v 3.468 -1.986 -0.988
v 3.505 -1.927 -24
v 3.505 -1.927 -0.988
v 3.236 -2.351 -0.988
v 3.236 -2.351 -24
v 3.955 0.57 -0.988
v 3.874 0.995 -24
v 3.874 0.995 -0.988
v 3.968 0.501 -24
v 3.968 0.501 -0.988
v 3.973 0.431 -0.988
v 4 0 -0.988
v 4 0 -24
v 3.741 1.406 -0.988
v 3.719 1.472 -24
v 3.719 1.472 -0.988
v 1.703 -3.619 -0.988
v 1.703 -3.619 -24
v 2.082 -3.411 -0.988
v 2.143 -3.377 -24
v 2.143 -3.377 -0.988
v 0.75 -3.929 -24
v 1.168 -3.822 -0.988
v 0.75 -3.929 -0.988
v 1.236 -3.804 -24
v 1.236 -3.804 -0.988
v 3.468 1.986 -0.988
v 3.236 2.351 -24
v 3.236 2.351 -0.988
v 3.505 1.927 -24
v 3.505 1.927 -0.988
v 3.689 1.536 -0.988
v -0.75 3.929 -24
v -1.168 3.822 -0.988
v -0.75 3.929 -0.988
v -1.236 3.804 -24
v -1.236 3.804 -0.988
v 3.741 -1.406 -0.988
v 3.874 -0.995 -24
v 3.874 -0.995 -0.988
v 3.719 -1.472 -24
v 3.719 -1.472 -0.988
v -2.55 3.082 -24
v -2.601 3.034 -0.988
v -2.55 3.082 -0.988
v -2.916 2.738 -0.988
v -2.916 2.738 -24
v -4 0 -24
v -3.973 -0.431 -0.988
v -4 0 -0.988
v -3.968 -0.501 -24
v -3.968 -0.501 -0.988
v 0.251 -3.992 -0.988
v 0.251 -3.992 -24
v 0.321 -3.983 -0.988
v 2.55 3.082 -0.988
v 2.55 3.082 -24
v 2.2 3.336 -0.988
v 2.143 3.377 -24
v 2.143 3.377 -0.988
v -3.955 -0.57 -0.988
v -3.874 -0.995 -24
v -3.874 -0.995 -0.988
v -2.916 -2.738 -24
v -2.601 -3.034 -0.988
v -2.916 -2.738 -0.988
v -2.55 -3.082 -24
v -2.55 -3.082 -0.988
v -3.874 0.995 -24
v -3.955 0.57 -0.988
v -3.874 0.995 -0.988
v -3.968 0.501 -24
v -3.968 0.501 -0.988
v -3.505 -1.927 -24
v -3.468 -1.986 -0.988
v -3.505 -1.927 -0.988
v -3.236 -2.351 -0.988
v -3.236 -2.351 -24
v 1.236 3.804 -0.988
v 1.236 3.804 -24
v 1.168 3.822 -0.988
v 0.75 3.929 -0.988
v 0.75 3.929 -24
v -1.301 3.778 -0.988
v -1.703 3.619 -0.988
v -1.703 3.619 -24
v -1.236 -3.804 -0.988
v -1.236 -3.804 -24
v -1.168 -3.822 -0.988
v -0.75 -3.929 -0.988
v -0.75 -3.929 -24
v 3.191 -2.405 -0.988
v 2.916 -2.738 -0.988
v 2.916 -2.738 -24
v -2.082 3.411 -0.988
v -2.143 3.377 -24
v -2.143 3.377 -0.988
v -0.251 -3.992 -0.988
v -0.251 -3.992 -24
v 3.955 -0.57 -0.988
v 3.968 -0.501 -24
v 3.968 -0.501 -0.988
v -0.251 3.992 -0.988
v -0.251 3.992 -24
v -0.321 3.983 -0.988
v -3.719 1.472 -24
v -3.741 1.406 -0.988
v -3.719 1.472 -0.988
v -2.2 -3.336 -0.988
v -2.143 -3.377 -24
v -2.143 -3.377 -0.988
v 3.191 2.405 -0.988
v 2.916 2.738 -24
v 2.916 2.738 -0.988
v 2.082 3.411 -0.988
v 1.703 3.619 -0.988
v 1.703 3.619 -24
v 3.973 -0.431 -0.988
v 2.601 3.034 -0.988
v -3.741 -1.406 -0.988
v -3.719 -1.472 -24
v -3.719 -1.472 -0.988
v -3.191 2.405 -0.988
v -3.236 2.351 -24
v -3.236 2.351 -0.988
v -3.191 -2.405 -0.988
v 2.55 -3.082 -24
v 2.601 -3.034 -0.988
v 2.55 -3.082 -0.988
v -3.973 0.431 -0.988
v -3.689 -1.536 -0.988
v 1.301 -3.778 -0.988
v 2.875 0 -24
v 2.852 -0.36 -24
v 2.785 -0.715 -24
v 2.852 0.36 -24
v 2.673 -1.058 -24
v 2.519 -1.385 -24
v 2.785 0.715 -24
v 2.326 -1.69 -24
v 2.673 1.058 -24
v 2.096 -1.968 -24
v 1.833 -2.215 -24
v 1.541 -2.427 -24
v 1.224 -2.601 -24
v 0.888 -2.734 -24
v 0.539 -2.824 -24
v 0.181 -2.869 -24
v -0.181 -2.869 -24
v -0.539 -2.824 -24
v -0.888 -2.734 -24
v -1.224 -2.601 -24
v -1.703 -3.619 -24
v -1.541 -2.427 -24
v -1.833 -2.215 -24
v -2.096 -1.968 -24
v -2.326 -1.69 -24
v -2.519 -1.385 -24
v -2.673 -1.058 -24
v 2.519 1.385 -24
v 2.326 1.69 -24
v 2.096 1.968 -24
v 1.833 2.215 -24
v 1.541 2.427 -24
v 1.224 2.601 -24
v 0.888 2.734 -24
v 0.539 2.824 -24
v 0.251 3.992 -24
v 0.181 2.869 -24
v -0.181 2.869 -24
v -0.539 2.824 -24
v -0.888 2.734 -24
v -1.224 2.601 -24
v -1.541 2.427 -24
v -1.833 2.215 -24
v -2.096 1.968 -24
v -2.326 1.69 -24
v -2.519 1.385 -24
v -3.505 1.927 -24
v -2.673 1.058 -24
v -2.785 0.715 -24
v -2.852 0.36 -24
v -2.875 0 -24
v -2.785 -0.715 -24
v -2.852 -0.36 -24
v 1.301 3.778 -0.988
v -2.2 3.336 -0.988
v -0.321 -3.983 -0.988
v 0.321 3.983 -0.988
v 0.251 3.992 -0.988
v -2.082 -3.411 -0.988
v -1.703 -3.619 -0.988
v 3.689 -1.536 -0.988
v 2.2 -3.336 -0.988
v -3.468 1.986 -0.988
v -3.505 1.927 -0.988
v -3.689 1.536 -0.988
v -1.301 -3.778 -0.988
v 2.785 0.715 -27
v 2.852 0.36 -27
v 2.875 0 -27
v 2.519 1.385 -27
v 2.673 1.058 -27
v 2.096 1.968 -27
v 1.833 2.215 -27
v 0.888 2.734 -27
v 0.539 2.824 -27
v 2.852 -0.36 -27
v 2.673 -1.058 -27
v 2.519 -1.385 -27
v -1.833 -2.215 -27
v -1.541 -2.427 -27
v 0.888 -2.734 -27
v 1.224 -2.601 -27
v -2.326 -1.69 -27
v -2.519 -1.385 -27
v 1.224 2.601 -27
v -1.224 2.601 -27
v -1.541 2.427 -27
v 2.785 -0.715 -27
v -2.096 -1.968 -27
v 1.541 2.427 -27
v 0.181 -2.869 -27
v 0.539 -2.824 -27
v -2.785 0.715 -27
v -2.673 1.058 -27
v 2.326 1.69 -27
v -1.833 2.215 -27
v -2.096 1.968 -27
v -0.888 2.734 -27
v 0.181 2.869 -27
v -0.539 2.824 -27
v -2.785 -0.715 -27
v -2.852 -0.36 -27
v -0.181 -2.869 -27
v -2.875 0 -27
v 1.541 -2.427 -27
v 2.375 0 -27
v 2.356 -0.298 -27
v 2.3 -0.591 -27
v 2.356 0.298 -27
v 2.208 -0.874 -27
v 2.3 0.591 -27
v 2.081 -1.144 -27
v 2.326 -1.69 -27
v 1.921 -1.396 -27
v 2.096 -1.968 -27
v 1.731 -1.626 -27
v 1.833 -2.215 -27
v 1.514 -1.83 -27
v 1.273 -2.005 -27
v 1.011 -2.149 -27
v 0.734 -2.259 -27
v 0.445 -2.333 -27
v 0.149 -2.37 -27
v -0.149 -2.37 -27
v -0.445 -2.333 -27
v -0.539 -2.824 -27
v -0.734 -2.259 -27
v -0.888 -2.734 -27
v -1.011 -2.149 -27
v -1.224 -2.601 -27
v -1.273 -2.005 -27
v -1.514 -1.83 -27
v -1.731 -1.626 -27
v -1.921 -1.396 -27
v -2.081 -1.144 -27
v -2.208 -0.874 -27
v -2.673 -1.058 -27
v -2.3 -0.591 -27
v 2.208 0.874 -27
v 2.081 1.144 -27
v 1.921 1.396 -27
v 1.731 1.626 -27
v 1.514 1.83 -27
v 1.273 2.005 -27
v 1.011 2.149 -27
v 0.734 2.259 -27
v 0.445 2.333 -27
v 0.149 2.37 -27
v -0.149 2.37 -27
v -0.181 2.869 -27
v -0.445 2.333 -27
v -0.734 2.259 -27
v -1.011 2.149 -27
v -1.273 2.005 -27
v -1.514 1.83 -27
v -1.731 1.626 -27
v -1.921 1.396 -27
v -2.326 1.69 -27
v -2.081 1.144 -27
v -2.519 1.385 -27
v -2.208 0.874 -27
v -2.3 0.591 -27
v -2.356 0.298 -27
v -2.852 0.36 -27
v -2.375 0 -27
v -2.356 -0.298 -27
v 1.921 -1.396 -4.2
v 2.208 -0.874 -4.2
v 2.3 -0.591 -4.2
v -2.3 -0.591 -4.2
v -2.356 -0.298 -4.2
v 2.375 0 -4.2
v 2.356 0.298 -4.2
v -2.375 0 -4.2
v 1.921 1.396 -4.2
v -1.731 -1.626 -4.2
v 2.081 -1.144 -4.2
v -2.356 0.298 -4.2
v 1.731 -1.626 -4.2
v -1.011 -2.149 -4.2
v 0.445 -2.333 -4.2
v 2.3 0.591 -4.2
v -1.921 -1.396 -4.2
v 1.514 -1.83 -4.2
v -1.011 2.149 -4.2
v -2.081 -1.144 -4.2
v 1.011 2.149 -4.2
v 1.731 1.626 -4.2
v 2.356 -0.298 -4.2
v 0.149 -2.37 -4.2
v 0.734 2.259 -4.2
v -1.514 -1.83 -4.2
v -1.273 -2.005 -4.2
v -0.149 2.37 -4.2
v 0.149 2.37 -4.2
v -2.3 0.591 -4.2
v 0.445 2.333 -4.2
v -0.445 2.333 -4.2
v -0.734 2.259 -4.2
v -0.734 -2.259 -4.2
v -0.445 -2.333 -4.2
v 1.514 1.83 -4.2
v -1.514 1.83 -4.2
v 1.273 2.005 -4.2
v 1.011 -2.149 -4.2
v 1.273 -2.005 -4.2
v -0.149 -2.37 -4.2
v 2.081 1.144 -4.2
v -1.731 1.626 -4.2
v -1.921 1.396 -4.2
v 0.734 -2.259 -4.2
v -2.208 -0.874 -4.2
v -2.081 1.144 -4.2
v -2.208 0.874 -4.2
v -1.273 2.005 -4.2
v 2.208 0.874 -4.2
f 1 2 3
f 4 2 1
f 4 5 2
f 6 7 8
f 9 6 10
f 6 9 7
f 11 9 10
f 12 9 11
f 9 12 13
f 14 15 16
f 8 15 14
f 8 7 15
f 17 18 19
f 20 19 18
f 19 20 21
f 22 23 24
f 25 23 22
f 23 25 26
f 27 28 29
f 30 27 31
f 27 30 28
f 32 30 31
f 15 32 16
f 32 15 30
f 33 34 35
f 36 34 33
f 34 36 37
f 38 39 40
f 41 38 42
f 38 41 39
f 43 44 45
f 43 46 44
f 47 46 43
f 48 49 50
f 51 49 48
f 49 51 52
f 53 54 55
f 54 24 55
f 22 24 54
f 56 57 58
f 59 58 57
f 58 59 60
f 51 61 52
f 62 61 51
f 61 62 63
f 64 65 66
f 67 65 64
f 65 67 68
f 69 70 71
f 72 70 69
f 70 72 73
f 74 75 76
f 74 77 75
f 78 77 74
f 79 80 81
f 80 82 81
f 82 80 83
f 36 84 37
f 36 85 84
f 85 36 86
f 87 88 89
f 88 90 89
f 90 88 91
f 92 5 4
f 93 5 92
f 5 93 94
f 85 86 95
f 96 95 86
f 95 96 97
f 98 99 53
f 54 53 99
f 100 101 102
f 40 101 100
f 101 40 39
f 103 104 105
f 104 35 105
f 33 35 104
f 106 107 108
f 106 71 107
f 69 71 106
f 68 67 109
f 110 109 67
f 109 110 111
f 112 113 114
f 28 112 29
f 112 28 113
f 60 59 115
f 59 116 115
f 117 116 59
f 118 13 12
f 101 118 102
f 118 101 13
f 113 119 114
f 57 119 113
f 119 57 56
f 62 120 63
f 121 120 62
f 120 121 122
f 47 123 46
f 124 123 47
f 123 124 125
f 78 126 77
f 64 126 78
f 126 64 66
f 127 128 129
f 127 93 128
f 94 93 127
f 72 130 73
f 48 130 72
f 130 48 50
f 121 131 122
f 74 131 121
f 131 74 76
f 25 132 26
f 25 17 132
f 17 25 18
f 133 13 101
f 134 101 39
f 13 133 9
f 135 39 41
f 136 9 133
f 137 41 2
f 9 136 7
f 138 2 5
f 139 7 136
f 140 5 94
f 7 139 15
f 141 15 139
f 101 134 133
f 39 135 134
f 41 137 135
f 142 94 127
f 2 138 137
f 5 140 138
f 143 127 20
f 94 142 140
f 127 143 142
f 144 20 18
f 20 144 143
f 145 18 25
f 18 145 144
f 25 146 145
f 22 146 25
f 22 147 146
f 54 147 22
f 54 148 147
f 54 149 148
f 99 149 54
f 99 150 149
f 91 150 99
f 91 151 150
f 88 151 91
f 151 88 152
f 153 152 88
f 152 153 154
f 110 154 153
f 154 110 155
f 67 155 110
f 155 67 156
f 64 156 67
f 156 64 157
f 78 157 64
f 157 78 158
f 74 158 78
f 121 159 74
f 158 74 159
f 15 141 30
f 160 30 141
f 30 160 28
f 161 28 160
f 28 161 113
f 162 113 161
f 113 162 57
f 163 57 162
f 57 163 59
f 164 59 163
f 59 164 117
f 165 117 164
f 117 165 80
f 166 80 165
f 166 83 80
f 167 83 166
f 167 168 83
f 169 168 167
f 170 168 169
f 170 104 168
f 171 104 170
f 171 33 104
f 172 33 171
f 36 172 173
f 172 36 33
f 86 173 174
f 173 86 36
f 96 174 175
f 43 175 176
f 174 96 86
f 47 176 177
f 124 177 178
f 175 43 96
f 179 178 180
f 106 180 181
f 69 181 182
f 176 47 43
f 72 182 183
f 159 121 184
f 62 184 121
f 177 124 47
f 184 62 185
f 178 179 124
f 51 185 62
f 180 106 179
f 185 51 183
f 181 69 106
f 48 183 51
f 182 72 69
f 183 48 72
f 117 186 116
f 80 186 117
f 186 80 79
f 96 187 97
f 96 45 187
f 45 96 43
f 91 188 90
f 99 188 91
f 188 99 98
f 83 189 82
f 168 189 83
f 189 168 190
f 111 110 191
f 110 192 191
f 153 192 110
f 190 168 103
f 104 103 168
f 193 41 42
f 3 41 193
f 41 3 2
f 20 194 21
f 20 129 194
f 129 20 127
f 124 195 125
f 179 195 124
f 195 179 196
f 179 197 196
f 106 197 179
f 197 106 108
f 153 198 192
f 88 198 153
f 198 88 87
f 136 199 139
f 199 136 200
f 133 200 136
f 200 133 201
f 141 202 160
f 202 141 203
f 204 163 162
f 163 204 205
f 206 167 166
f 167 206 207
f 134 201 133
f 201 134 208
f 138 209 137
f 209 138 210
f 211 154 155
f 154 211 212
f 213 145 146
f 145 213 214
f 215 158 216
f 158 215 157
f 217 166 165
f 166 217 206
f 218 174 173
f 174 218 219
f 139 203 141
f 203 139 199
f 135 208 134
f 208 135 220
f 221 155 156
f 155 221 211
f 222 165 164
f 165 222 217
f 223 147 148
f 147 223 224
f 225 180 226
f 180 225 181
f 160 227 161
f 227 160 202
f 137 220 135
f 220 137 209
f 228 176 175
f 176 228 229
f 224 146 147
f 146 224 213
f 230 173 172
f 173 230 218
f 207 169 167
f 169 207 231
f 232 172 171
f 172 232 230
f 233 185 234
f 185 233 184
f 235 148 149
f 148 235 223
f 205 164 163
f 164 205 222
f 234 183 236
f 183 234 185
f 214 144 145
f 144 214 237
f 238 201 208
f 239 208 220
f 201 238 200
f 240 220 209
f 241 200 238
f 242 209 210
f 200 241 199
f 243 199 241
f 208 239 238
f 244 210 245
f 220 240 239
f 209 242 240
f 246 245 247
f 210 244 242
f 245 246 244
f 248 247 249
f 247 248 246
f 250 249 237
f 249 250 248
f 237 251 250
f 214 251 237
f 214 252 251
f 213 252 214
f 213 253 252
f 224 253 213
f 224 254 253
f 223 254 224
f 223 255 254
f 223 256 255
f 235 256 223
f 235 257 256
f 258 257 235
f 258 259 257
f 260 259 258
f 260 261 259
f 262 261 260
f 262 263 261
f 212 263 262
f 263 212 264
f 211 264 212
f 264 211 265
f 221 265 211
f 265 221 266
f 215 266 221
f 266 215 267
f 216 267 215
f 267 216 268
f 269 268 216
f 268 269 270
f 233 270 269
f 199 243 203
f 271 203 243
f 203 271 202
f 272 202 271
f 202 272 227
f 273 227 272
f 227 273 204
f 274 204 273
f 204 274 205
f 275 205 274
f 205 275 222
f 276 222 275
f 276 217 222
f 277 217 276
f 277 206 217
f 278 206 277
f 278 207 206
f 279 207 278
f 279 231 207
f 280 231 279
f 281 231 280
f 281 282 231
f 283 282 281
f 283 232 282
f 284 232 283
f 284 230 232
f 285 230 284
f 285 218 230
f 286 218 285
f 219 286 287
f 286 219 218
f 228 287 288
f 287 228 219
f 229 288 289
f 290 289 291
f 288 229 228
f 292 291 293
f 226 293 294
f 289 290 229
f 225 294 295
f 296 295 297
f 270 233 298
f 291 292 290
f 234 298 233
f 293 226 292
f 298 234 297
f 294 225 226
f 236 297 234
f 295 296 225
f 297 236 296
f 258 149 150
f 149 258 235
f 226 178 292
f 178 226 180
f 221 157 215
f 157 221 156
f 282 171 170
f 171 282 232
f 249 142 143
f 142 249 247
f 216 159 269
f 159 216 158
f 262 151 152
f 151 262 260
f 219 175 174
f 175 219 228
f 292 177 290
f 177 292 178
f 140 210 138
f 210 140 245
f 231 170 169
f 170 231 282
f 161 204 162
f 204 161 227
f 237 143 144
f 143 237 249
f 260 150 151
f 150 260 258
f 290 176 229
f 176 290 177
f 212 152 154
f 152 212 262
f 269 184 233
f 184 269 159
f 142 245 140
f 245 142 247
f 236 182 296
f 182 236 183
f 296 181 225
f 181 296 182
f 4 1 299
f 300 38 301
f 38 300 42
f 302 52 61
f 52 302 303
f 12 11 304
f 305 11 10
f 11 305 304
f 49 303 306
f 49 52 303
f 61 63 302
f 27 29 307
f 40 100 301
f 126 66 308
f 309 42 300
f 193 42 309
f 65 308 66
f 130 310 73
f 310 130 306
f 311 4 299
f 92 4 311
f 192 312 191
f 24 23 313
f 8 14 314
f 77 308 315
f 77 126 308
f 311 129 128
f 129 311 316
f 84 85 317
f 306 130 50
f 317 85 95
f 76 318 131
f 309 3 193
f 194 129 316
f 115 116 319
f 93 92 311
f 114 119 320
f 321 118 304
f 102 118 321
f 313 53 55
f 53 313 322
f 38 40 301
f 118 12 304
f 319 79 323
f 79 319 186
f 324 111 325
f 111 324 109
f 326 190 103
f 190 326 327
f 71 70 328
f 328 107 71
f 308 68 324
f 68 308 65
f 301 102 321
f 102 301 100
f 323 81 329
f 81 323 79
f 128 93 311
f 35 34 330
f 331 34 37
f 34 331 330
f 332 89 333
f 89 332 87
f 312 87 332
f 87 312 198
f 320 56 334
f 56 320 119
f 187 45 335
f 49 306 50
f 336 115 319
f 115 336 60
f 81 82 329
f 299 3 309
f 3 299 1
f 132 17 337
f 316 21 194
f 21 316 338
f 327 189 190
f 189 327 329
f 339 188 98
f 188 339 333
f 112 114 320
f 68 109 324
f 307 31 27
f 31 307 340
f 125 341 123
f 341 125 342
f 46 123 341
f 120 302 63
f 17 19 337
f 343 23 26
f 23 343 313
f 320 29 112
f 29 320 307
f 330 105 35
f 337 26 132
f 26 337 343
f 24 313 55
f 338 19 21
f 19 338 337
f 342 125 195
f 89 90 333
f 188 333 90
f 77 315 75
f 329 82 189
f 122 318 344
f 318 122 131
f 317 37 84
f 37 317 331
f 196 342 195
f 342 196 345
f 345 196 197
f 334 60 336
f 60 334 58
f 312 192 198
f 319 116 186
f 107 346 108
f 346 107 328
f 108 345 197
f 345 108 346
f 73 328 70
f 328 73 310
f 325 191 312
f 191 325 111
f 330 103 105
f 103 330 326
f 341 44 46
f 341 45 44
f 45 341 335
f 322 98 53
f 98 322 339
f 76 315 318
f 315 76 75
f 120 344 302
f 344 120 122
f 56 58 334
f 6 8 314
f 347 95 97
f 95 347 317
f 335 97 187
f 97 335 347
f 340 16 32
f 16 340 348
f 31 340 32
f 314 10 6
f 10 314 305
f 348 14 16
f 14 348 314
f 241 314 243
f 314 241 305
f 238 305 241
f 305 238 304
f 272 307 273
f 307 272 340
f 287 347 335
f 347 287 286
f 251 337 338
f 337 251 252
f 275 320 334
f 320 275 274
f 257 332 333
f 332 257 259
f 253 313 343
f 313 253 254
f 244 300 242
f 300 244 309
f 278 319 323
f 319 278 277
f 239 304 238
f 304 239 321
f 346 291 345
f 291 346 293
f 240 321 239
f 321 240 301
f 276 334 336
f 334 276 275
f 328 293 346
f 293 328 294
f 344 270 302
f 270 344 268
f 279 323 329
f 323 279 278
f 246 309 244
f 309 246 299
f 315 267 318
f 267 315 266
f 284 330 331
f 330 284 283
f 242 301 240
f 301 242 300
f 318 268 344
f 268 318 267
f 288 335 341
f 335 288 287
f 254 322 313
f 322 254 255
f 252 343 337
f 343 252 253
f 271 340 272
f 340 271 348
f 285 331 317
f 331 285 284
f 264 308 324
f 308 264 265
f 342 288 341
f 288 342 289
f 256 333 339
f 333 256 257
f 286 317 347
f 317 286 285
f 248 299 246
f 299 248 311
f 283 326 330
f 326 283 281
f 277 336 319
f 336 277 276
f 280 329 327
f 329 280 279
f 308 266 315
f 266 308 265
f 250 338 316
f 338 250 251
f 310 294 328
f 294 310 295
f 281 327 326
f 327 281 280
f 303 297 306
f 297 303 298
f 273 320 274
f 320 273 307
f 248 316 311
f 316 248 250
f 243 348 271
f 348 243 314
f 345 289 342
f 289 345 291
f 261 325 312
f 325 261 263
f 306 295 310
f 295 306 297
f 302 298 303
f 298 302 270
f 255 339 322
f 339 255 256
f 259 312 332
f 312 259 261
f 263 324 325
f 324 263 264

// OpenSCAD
$fn = 50;

difference() {
	union() {
		translate(v = [0, 0, -24.0]) {
			cylinder(h = 27, r = 4.0);
		}
		#translate(v = [0, 0, -27.0]) {
			cylinder(h = 27, r = 2.875);
		}
	}
	union() {
		translate(v = [0, 0, 0]) {
			rotate(a = [0, 0, 0]) {
				difference() {
					union() {
						translate(v = [0, 0, -27.0]) {
							cylinder(h = 27, r = 2.25);
						}
						translate(v = [0, 0, -4.2]) {
							cylinder(h = 4.2, r1 = 2.375, r2 = 4.5);
						}
						translate(v = [0, 0, -27.0]) {
							cylinder(h = 27, r = 2.375);
						}
						translate(v = [0, 0, -27.0]) {
							cylinder(h = 27, r = 2.25);
						}
					}
					union();
				}
			}
		}
		#cylinder(h = 3, r = 5.0);
	}
}
